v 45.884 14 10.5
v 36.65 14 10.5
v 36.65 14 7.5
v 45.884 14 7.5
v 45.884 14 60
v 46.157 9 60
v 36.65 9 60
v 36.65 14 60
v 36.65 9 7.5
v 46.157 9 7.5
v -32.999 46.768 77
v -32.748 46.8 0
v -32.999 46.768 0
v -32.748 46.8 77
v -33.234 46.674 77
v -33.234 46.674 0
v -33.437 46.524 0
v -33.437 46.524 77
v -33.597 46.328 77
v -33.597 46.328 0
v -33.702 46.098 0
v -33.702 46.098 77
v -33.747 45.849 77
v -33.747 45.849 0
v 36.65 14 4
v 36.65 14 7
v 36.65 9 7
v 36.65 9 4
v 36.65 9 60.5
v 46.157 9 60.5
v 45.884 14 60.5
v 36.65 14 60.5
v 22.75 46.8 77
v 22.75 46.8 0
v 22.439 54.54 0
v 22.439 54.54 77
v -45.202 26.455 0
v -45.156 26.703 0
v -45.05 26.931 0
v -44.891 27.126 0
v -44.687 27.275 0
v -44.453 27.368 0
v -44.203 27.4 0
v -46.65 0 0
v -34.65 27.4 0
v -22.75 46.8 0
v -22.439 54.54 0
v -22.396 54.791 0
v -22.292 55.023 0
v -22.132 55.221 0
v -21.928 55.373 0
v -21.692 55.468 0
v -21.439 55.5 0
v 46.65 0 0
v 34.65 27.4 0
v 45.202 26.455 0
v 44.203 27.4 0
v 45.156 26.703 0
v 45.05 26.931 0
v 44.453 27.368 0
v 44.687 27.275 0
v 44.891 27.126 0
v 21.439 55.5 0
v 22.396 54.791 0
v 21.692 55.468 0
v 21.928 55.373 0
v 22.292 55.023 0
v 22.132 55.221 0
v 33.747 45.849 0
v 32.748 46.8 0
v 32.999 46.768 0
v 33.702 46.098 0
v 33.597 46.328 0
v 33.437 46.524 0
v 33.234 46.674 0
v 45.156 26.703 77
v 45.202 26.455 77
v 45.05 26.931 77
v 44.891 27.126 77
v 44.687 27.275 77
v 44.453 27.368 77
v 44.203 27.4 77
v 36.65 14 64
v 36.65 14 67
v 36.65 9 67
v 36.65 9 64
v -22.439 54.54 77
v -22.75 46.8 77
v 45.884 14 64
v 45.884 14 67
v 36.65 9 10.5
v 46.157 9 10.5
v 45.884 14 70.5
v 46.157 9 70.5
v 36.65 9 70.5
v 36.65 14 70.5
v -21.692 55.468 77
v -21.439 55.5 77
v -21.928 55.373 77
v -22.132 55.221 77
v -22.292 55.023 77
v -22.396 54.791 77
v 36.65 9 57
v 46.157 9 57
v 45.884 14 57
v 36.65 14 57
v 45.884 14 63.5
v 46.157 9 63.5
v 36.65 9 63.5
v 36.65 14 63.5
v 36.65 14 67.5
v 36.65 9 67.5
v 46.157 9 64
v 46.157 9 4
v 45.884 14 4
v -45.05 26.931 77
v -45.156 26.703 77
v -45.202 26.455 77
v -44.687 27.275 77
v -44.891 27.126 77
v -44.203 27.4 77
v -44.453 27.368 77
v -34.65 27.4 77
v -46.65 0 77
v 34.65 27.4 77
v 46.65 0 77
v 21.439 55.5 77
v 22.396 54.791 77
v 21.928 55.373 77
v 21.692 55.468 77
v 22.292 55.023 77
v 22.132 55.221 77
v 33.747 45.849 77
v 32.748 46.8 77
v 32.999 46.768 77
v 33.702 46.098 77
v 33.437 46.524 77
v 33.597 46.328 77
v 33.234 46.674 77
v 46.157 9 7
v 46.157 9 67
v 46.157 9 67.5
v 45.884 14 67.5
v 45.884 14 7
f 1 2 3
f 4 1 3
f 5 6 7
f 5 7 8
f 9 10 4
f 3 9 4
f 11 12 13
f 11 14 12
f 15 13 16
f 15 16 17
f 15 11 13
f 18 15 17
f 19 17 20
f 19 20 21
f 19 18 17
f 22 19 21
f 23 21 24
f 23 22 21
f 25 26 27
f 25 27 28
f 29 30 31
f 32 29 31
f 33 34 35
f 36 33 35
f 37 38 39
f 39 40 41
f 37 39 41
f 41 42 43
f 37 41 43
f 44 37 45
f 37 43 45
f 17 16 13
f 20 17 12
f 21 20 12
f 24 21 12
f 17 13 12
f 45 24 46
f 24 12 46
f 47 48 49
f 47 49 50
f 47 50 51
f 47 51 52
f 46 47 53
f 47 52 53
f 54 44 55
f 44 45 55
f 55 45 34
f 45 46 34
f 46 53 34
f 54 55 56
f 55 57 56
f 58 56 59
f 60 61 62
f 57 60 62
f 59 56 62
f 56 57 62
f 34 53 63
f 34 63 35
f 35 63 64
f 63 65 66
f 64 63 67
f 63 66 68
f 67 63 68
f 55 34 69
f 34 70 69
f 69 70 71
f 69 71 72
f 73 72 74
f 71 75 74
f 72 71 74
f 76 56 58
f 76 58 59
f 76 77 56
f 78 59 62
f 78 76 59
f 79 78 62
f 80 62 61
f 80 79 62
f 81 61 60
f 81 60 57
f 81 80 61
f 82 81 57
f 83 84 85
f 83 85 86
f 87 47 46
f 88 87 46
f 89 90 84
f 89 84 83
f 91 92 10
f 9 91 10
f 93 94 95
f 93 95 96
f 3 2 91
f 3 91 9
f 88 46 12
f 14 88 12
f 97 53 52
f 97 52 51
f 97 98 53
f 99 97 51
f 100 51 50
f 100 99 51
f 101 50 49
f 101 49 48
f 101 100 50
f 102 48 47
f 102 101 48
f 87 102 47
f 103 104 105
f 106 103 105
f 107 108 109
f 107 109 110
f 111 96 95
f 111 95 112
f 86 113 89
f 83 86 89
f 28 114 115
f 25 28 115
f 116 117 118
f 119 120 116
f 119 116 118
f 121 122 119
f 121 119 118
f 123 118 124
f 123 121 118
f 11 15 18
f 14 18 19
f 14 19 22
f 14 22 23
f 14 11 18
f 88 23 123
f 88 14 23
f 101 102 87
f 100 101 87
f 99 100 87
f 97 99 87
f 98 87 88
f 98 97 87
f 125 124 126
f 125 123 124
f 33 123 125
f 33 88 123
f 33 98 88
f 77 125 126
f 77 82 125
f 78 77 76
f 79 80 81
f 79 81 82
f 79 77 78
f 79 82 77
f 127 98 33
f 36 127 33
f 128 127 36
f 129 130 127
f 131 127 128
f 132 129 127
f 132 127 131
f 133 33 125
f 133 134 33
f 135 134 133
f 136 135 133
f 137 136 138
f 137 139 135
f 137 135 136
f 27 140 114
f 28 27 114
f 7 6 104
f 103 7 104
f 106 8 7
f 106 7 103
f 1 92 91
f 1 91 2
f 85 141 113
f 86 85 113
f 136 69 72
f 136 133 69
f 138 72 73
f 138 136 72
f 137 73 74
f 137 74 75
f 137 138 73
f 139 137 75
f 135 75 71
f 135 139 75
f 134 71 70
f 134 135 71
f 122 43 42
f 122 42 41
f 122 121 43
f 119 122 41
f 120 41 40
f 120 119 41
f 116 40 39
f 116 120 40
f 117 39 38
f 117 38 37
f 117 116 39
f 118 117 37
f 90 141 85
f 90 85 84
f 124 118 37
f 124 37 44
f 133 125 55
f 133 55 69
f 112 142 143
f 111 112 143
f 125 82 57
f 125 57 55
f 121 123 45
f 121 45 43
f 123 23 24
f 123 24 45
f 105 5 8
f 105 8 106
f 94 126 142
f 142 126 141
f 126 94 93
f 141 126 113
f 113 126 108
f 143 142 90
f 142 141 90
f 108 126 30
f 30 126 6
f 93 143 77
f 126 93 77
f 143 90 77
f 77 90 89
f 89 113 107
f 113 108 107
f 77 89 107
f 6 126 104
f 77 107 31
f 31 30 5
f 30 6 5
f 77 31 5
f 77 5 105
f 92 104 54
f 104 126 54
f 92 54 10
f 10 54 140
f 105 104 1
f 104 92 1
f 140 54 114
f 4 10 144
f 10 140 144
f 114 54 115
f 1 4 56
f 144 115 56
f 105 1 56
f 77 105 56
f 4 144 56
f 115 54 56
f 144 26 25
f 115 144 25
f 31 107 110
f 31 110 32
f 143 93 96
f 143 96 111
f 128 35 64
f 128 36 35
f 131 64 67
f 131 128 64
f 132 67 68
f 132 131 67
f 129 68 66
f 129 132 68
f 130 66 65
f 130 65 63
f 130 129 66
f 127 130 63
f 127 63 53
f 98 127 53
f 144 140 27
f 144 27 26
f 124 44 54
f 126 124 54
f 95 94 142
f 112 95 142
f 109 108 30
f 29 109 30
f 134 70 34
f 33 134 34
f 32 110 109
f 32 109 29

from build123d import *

# Parameters (mm, degrees)
BOSS_EXTRUDE1_DEPTH       = 77
FILLET1_R                 = 1
SKETCH2_W                 = 3
SKETCH2_H                 = 5
CUT_EXTRUDE1_DEPTH        = 10
LPATTERN1_COUNT           = 2
LPATTERN1_PITCH           = 3.5
LPATTERN2_COUNT           = 2
LPATTERN2_PITCH           = 60
LPATTERN2_COPY_1_SKETCH_W = 3
LPATTERN2_COPY_1_SKETCH_H = 5
LPATTERN2_COPY_1_DEPTH    = 10
LPATTERN4_COUNT           = 2
LPATTERN4_PITCH           = 53
LPATTERN4_COPY_1_SKETCH_W = 3
LPATTERN4_COPY_1_SKETCH_H = 5
LPATTERN4_COPY_1_DEPTH    = 10


with BuildPart() as part:
    # Sketch1 → Boss-Extrude1 (new body)
    with BuildSketch(Plane.XY):
        Polygon((-46.65, 0), (46.65, 0), (45.15, 27.4), (34.65, 27.4), (33.7, 46.8), (22.75, 46.8), (22.4, 55.5), (-22.4, 55.5), (-22.75, 46.8), (-33.7, 46.8), (-34.65, 27.4), (-45.15, 27.4), align=None)
    extrude(amount=BOSS_EXTRUDE1_DEPTH)

    # Fillet1
    fillet1_edges = [part.edges().sort_by_distance(p)[0] for p in [
        (-45.15, 27.4, 38.5),
        (-33.7, 46.8, 38.5),
        (-22.4, 55.5, 38.5),
        (22.4, 55.5, 38.5),
        (33.7, 46.8, 38.5),
        (45.15, 27.4, 38.5),
    ]]
    fillet(fillet1_edges, radius=FILLET1_R)

    # Sketch2 → Cut-Extrude1 (cut)
    with BuildSketch(Plane(origin=(46.65, 0, 0), x_dir=(0, 0, -1), z_dir=(1, 0, 0))):
        with Locations((-5.5, 11.5)):
            Rectangle(SKETCH2_W, SKETCH2_H)
    cut_extrude1 = extrude(amount=-CUT_EXTRUDE1_DEPTH, mode=Mode.SUBTRACT)

    # LPattern1: Cut-Extrude1 ×2
    with Locations(*[(0, 0, i * LPATTERN1_PITCH) for i in range(1, LPATTERN1_COUNT)]):
        add(cut_extrude1, mode=Mode.SUBTRACT)

    # LPattern2: Cut-Extrude1 ×2
    with Locations(*[(0, 0, i * LPATTERN2_PITCH) for i in range(1, LPATTERN2_COUNT)]):
        add(cut_extrude1, mode=Mode.SUBTRACT)

    # LPattern2 copy 1 sketch → LPattern2 copy 1 (cut)
    with BuildSketch(Plane(origin=(46.65, 0, 63.5), x_dir=(0, 0, -1), z_dir=(1, 0, 0))):
        with Locations((-5.5, 11.5)):
            Rectangle(LPATTERN2_COPY_1_SKETCH_W, LPATTERN2_COPY_1_SKETCH_H)
    extrude(amount=-LPATTERN2_COPY_1_DEPTH, mode=Mode.SUBTRACT)

    # LPattern4: Cut-Extrude1 ×2
    with Locations(*[(0, 0, i * LPATTERN4_PITCH) for i in range(1, LPATTERN4_COUNT)]):
        add(cut_extrude1, mode=Mode.SUBTRACT)

    # LPattern4 copy 1 sketch → LPattern4 copy 1 (cut)
    with BuildSketch(Plane(origin=(46.65, 0, 56.5), x_dir=(0, 0, -1), z_dir=(1, 0, 0))):
        with Locations((-5.5, 11.5)):
            Rectangle(LPATTERN4_COPY_1_SKETCH_W, LPATTERN4_COPY_1_SKETCH_H)
    extrude(amount=-LPATTERN4_COPY_1_DEPTH, mode=Mode.SUBTRACT)


solid = part.part
